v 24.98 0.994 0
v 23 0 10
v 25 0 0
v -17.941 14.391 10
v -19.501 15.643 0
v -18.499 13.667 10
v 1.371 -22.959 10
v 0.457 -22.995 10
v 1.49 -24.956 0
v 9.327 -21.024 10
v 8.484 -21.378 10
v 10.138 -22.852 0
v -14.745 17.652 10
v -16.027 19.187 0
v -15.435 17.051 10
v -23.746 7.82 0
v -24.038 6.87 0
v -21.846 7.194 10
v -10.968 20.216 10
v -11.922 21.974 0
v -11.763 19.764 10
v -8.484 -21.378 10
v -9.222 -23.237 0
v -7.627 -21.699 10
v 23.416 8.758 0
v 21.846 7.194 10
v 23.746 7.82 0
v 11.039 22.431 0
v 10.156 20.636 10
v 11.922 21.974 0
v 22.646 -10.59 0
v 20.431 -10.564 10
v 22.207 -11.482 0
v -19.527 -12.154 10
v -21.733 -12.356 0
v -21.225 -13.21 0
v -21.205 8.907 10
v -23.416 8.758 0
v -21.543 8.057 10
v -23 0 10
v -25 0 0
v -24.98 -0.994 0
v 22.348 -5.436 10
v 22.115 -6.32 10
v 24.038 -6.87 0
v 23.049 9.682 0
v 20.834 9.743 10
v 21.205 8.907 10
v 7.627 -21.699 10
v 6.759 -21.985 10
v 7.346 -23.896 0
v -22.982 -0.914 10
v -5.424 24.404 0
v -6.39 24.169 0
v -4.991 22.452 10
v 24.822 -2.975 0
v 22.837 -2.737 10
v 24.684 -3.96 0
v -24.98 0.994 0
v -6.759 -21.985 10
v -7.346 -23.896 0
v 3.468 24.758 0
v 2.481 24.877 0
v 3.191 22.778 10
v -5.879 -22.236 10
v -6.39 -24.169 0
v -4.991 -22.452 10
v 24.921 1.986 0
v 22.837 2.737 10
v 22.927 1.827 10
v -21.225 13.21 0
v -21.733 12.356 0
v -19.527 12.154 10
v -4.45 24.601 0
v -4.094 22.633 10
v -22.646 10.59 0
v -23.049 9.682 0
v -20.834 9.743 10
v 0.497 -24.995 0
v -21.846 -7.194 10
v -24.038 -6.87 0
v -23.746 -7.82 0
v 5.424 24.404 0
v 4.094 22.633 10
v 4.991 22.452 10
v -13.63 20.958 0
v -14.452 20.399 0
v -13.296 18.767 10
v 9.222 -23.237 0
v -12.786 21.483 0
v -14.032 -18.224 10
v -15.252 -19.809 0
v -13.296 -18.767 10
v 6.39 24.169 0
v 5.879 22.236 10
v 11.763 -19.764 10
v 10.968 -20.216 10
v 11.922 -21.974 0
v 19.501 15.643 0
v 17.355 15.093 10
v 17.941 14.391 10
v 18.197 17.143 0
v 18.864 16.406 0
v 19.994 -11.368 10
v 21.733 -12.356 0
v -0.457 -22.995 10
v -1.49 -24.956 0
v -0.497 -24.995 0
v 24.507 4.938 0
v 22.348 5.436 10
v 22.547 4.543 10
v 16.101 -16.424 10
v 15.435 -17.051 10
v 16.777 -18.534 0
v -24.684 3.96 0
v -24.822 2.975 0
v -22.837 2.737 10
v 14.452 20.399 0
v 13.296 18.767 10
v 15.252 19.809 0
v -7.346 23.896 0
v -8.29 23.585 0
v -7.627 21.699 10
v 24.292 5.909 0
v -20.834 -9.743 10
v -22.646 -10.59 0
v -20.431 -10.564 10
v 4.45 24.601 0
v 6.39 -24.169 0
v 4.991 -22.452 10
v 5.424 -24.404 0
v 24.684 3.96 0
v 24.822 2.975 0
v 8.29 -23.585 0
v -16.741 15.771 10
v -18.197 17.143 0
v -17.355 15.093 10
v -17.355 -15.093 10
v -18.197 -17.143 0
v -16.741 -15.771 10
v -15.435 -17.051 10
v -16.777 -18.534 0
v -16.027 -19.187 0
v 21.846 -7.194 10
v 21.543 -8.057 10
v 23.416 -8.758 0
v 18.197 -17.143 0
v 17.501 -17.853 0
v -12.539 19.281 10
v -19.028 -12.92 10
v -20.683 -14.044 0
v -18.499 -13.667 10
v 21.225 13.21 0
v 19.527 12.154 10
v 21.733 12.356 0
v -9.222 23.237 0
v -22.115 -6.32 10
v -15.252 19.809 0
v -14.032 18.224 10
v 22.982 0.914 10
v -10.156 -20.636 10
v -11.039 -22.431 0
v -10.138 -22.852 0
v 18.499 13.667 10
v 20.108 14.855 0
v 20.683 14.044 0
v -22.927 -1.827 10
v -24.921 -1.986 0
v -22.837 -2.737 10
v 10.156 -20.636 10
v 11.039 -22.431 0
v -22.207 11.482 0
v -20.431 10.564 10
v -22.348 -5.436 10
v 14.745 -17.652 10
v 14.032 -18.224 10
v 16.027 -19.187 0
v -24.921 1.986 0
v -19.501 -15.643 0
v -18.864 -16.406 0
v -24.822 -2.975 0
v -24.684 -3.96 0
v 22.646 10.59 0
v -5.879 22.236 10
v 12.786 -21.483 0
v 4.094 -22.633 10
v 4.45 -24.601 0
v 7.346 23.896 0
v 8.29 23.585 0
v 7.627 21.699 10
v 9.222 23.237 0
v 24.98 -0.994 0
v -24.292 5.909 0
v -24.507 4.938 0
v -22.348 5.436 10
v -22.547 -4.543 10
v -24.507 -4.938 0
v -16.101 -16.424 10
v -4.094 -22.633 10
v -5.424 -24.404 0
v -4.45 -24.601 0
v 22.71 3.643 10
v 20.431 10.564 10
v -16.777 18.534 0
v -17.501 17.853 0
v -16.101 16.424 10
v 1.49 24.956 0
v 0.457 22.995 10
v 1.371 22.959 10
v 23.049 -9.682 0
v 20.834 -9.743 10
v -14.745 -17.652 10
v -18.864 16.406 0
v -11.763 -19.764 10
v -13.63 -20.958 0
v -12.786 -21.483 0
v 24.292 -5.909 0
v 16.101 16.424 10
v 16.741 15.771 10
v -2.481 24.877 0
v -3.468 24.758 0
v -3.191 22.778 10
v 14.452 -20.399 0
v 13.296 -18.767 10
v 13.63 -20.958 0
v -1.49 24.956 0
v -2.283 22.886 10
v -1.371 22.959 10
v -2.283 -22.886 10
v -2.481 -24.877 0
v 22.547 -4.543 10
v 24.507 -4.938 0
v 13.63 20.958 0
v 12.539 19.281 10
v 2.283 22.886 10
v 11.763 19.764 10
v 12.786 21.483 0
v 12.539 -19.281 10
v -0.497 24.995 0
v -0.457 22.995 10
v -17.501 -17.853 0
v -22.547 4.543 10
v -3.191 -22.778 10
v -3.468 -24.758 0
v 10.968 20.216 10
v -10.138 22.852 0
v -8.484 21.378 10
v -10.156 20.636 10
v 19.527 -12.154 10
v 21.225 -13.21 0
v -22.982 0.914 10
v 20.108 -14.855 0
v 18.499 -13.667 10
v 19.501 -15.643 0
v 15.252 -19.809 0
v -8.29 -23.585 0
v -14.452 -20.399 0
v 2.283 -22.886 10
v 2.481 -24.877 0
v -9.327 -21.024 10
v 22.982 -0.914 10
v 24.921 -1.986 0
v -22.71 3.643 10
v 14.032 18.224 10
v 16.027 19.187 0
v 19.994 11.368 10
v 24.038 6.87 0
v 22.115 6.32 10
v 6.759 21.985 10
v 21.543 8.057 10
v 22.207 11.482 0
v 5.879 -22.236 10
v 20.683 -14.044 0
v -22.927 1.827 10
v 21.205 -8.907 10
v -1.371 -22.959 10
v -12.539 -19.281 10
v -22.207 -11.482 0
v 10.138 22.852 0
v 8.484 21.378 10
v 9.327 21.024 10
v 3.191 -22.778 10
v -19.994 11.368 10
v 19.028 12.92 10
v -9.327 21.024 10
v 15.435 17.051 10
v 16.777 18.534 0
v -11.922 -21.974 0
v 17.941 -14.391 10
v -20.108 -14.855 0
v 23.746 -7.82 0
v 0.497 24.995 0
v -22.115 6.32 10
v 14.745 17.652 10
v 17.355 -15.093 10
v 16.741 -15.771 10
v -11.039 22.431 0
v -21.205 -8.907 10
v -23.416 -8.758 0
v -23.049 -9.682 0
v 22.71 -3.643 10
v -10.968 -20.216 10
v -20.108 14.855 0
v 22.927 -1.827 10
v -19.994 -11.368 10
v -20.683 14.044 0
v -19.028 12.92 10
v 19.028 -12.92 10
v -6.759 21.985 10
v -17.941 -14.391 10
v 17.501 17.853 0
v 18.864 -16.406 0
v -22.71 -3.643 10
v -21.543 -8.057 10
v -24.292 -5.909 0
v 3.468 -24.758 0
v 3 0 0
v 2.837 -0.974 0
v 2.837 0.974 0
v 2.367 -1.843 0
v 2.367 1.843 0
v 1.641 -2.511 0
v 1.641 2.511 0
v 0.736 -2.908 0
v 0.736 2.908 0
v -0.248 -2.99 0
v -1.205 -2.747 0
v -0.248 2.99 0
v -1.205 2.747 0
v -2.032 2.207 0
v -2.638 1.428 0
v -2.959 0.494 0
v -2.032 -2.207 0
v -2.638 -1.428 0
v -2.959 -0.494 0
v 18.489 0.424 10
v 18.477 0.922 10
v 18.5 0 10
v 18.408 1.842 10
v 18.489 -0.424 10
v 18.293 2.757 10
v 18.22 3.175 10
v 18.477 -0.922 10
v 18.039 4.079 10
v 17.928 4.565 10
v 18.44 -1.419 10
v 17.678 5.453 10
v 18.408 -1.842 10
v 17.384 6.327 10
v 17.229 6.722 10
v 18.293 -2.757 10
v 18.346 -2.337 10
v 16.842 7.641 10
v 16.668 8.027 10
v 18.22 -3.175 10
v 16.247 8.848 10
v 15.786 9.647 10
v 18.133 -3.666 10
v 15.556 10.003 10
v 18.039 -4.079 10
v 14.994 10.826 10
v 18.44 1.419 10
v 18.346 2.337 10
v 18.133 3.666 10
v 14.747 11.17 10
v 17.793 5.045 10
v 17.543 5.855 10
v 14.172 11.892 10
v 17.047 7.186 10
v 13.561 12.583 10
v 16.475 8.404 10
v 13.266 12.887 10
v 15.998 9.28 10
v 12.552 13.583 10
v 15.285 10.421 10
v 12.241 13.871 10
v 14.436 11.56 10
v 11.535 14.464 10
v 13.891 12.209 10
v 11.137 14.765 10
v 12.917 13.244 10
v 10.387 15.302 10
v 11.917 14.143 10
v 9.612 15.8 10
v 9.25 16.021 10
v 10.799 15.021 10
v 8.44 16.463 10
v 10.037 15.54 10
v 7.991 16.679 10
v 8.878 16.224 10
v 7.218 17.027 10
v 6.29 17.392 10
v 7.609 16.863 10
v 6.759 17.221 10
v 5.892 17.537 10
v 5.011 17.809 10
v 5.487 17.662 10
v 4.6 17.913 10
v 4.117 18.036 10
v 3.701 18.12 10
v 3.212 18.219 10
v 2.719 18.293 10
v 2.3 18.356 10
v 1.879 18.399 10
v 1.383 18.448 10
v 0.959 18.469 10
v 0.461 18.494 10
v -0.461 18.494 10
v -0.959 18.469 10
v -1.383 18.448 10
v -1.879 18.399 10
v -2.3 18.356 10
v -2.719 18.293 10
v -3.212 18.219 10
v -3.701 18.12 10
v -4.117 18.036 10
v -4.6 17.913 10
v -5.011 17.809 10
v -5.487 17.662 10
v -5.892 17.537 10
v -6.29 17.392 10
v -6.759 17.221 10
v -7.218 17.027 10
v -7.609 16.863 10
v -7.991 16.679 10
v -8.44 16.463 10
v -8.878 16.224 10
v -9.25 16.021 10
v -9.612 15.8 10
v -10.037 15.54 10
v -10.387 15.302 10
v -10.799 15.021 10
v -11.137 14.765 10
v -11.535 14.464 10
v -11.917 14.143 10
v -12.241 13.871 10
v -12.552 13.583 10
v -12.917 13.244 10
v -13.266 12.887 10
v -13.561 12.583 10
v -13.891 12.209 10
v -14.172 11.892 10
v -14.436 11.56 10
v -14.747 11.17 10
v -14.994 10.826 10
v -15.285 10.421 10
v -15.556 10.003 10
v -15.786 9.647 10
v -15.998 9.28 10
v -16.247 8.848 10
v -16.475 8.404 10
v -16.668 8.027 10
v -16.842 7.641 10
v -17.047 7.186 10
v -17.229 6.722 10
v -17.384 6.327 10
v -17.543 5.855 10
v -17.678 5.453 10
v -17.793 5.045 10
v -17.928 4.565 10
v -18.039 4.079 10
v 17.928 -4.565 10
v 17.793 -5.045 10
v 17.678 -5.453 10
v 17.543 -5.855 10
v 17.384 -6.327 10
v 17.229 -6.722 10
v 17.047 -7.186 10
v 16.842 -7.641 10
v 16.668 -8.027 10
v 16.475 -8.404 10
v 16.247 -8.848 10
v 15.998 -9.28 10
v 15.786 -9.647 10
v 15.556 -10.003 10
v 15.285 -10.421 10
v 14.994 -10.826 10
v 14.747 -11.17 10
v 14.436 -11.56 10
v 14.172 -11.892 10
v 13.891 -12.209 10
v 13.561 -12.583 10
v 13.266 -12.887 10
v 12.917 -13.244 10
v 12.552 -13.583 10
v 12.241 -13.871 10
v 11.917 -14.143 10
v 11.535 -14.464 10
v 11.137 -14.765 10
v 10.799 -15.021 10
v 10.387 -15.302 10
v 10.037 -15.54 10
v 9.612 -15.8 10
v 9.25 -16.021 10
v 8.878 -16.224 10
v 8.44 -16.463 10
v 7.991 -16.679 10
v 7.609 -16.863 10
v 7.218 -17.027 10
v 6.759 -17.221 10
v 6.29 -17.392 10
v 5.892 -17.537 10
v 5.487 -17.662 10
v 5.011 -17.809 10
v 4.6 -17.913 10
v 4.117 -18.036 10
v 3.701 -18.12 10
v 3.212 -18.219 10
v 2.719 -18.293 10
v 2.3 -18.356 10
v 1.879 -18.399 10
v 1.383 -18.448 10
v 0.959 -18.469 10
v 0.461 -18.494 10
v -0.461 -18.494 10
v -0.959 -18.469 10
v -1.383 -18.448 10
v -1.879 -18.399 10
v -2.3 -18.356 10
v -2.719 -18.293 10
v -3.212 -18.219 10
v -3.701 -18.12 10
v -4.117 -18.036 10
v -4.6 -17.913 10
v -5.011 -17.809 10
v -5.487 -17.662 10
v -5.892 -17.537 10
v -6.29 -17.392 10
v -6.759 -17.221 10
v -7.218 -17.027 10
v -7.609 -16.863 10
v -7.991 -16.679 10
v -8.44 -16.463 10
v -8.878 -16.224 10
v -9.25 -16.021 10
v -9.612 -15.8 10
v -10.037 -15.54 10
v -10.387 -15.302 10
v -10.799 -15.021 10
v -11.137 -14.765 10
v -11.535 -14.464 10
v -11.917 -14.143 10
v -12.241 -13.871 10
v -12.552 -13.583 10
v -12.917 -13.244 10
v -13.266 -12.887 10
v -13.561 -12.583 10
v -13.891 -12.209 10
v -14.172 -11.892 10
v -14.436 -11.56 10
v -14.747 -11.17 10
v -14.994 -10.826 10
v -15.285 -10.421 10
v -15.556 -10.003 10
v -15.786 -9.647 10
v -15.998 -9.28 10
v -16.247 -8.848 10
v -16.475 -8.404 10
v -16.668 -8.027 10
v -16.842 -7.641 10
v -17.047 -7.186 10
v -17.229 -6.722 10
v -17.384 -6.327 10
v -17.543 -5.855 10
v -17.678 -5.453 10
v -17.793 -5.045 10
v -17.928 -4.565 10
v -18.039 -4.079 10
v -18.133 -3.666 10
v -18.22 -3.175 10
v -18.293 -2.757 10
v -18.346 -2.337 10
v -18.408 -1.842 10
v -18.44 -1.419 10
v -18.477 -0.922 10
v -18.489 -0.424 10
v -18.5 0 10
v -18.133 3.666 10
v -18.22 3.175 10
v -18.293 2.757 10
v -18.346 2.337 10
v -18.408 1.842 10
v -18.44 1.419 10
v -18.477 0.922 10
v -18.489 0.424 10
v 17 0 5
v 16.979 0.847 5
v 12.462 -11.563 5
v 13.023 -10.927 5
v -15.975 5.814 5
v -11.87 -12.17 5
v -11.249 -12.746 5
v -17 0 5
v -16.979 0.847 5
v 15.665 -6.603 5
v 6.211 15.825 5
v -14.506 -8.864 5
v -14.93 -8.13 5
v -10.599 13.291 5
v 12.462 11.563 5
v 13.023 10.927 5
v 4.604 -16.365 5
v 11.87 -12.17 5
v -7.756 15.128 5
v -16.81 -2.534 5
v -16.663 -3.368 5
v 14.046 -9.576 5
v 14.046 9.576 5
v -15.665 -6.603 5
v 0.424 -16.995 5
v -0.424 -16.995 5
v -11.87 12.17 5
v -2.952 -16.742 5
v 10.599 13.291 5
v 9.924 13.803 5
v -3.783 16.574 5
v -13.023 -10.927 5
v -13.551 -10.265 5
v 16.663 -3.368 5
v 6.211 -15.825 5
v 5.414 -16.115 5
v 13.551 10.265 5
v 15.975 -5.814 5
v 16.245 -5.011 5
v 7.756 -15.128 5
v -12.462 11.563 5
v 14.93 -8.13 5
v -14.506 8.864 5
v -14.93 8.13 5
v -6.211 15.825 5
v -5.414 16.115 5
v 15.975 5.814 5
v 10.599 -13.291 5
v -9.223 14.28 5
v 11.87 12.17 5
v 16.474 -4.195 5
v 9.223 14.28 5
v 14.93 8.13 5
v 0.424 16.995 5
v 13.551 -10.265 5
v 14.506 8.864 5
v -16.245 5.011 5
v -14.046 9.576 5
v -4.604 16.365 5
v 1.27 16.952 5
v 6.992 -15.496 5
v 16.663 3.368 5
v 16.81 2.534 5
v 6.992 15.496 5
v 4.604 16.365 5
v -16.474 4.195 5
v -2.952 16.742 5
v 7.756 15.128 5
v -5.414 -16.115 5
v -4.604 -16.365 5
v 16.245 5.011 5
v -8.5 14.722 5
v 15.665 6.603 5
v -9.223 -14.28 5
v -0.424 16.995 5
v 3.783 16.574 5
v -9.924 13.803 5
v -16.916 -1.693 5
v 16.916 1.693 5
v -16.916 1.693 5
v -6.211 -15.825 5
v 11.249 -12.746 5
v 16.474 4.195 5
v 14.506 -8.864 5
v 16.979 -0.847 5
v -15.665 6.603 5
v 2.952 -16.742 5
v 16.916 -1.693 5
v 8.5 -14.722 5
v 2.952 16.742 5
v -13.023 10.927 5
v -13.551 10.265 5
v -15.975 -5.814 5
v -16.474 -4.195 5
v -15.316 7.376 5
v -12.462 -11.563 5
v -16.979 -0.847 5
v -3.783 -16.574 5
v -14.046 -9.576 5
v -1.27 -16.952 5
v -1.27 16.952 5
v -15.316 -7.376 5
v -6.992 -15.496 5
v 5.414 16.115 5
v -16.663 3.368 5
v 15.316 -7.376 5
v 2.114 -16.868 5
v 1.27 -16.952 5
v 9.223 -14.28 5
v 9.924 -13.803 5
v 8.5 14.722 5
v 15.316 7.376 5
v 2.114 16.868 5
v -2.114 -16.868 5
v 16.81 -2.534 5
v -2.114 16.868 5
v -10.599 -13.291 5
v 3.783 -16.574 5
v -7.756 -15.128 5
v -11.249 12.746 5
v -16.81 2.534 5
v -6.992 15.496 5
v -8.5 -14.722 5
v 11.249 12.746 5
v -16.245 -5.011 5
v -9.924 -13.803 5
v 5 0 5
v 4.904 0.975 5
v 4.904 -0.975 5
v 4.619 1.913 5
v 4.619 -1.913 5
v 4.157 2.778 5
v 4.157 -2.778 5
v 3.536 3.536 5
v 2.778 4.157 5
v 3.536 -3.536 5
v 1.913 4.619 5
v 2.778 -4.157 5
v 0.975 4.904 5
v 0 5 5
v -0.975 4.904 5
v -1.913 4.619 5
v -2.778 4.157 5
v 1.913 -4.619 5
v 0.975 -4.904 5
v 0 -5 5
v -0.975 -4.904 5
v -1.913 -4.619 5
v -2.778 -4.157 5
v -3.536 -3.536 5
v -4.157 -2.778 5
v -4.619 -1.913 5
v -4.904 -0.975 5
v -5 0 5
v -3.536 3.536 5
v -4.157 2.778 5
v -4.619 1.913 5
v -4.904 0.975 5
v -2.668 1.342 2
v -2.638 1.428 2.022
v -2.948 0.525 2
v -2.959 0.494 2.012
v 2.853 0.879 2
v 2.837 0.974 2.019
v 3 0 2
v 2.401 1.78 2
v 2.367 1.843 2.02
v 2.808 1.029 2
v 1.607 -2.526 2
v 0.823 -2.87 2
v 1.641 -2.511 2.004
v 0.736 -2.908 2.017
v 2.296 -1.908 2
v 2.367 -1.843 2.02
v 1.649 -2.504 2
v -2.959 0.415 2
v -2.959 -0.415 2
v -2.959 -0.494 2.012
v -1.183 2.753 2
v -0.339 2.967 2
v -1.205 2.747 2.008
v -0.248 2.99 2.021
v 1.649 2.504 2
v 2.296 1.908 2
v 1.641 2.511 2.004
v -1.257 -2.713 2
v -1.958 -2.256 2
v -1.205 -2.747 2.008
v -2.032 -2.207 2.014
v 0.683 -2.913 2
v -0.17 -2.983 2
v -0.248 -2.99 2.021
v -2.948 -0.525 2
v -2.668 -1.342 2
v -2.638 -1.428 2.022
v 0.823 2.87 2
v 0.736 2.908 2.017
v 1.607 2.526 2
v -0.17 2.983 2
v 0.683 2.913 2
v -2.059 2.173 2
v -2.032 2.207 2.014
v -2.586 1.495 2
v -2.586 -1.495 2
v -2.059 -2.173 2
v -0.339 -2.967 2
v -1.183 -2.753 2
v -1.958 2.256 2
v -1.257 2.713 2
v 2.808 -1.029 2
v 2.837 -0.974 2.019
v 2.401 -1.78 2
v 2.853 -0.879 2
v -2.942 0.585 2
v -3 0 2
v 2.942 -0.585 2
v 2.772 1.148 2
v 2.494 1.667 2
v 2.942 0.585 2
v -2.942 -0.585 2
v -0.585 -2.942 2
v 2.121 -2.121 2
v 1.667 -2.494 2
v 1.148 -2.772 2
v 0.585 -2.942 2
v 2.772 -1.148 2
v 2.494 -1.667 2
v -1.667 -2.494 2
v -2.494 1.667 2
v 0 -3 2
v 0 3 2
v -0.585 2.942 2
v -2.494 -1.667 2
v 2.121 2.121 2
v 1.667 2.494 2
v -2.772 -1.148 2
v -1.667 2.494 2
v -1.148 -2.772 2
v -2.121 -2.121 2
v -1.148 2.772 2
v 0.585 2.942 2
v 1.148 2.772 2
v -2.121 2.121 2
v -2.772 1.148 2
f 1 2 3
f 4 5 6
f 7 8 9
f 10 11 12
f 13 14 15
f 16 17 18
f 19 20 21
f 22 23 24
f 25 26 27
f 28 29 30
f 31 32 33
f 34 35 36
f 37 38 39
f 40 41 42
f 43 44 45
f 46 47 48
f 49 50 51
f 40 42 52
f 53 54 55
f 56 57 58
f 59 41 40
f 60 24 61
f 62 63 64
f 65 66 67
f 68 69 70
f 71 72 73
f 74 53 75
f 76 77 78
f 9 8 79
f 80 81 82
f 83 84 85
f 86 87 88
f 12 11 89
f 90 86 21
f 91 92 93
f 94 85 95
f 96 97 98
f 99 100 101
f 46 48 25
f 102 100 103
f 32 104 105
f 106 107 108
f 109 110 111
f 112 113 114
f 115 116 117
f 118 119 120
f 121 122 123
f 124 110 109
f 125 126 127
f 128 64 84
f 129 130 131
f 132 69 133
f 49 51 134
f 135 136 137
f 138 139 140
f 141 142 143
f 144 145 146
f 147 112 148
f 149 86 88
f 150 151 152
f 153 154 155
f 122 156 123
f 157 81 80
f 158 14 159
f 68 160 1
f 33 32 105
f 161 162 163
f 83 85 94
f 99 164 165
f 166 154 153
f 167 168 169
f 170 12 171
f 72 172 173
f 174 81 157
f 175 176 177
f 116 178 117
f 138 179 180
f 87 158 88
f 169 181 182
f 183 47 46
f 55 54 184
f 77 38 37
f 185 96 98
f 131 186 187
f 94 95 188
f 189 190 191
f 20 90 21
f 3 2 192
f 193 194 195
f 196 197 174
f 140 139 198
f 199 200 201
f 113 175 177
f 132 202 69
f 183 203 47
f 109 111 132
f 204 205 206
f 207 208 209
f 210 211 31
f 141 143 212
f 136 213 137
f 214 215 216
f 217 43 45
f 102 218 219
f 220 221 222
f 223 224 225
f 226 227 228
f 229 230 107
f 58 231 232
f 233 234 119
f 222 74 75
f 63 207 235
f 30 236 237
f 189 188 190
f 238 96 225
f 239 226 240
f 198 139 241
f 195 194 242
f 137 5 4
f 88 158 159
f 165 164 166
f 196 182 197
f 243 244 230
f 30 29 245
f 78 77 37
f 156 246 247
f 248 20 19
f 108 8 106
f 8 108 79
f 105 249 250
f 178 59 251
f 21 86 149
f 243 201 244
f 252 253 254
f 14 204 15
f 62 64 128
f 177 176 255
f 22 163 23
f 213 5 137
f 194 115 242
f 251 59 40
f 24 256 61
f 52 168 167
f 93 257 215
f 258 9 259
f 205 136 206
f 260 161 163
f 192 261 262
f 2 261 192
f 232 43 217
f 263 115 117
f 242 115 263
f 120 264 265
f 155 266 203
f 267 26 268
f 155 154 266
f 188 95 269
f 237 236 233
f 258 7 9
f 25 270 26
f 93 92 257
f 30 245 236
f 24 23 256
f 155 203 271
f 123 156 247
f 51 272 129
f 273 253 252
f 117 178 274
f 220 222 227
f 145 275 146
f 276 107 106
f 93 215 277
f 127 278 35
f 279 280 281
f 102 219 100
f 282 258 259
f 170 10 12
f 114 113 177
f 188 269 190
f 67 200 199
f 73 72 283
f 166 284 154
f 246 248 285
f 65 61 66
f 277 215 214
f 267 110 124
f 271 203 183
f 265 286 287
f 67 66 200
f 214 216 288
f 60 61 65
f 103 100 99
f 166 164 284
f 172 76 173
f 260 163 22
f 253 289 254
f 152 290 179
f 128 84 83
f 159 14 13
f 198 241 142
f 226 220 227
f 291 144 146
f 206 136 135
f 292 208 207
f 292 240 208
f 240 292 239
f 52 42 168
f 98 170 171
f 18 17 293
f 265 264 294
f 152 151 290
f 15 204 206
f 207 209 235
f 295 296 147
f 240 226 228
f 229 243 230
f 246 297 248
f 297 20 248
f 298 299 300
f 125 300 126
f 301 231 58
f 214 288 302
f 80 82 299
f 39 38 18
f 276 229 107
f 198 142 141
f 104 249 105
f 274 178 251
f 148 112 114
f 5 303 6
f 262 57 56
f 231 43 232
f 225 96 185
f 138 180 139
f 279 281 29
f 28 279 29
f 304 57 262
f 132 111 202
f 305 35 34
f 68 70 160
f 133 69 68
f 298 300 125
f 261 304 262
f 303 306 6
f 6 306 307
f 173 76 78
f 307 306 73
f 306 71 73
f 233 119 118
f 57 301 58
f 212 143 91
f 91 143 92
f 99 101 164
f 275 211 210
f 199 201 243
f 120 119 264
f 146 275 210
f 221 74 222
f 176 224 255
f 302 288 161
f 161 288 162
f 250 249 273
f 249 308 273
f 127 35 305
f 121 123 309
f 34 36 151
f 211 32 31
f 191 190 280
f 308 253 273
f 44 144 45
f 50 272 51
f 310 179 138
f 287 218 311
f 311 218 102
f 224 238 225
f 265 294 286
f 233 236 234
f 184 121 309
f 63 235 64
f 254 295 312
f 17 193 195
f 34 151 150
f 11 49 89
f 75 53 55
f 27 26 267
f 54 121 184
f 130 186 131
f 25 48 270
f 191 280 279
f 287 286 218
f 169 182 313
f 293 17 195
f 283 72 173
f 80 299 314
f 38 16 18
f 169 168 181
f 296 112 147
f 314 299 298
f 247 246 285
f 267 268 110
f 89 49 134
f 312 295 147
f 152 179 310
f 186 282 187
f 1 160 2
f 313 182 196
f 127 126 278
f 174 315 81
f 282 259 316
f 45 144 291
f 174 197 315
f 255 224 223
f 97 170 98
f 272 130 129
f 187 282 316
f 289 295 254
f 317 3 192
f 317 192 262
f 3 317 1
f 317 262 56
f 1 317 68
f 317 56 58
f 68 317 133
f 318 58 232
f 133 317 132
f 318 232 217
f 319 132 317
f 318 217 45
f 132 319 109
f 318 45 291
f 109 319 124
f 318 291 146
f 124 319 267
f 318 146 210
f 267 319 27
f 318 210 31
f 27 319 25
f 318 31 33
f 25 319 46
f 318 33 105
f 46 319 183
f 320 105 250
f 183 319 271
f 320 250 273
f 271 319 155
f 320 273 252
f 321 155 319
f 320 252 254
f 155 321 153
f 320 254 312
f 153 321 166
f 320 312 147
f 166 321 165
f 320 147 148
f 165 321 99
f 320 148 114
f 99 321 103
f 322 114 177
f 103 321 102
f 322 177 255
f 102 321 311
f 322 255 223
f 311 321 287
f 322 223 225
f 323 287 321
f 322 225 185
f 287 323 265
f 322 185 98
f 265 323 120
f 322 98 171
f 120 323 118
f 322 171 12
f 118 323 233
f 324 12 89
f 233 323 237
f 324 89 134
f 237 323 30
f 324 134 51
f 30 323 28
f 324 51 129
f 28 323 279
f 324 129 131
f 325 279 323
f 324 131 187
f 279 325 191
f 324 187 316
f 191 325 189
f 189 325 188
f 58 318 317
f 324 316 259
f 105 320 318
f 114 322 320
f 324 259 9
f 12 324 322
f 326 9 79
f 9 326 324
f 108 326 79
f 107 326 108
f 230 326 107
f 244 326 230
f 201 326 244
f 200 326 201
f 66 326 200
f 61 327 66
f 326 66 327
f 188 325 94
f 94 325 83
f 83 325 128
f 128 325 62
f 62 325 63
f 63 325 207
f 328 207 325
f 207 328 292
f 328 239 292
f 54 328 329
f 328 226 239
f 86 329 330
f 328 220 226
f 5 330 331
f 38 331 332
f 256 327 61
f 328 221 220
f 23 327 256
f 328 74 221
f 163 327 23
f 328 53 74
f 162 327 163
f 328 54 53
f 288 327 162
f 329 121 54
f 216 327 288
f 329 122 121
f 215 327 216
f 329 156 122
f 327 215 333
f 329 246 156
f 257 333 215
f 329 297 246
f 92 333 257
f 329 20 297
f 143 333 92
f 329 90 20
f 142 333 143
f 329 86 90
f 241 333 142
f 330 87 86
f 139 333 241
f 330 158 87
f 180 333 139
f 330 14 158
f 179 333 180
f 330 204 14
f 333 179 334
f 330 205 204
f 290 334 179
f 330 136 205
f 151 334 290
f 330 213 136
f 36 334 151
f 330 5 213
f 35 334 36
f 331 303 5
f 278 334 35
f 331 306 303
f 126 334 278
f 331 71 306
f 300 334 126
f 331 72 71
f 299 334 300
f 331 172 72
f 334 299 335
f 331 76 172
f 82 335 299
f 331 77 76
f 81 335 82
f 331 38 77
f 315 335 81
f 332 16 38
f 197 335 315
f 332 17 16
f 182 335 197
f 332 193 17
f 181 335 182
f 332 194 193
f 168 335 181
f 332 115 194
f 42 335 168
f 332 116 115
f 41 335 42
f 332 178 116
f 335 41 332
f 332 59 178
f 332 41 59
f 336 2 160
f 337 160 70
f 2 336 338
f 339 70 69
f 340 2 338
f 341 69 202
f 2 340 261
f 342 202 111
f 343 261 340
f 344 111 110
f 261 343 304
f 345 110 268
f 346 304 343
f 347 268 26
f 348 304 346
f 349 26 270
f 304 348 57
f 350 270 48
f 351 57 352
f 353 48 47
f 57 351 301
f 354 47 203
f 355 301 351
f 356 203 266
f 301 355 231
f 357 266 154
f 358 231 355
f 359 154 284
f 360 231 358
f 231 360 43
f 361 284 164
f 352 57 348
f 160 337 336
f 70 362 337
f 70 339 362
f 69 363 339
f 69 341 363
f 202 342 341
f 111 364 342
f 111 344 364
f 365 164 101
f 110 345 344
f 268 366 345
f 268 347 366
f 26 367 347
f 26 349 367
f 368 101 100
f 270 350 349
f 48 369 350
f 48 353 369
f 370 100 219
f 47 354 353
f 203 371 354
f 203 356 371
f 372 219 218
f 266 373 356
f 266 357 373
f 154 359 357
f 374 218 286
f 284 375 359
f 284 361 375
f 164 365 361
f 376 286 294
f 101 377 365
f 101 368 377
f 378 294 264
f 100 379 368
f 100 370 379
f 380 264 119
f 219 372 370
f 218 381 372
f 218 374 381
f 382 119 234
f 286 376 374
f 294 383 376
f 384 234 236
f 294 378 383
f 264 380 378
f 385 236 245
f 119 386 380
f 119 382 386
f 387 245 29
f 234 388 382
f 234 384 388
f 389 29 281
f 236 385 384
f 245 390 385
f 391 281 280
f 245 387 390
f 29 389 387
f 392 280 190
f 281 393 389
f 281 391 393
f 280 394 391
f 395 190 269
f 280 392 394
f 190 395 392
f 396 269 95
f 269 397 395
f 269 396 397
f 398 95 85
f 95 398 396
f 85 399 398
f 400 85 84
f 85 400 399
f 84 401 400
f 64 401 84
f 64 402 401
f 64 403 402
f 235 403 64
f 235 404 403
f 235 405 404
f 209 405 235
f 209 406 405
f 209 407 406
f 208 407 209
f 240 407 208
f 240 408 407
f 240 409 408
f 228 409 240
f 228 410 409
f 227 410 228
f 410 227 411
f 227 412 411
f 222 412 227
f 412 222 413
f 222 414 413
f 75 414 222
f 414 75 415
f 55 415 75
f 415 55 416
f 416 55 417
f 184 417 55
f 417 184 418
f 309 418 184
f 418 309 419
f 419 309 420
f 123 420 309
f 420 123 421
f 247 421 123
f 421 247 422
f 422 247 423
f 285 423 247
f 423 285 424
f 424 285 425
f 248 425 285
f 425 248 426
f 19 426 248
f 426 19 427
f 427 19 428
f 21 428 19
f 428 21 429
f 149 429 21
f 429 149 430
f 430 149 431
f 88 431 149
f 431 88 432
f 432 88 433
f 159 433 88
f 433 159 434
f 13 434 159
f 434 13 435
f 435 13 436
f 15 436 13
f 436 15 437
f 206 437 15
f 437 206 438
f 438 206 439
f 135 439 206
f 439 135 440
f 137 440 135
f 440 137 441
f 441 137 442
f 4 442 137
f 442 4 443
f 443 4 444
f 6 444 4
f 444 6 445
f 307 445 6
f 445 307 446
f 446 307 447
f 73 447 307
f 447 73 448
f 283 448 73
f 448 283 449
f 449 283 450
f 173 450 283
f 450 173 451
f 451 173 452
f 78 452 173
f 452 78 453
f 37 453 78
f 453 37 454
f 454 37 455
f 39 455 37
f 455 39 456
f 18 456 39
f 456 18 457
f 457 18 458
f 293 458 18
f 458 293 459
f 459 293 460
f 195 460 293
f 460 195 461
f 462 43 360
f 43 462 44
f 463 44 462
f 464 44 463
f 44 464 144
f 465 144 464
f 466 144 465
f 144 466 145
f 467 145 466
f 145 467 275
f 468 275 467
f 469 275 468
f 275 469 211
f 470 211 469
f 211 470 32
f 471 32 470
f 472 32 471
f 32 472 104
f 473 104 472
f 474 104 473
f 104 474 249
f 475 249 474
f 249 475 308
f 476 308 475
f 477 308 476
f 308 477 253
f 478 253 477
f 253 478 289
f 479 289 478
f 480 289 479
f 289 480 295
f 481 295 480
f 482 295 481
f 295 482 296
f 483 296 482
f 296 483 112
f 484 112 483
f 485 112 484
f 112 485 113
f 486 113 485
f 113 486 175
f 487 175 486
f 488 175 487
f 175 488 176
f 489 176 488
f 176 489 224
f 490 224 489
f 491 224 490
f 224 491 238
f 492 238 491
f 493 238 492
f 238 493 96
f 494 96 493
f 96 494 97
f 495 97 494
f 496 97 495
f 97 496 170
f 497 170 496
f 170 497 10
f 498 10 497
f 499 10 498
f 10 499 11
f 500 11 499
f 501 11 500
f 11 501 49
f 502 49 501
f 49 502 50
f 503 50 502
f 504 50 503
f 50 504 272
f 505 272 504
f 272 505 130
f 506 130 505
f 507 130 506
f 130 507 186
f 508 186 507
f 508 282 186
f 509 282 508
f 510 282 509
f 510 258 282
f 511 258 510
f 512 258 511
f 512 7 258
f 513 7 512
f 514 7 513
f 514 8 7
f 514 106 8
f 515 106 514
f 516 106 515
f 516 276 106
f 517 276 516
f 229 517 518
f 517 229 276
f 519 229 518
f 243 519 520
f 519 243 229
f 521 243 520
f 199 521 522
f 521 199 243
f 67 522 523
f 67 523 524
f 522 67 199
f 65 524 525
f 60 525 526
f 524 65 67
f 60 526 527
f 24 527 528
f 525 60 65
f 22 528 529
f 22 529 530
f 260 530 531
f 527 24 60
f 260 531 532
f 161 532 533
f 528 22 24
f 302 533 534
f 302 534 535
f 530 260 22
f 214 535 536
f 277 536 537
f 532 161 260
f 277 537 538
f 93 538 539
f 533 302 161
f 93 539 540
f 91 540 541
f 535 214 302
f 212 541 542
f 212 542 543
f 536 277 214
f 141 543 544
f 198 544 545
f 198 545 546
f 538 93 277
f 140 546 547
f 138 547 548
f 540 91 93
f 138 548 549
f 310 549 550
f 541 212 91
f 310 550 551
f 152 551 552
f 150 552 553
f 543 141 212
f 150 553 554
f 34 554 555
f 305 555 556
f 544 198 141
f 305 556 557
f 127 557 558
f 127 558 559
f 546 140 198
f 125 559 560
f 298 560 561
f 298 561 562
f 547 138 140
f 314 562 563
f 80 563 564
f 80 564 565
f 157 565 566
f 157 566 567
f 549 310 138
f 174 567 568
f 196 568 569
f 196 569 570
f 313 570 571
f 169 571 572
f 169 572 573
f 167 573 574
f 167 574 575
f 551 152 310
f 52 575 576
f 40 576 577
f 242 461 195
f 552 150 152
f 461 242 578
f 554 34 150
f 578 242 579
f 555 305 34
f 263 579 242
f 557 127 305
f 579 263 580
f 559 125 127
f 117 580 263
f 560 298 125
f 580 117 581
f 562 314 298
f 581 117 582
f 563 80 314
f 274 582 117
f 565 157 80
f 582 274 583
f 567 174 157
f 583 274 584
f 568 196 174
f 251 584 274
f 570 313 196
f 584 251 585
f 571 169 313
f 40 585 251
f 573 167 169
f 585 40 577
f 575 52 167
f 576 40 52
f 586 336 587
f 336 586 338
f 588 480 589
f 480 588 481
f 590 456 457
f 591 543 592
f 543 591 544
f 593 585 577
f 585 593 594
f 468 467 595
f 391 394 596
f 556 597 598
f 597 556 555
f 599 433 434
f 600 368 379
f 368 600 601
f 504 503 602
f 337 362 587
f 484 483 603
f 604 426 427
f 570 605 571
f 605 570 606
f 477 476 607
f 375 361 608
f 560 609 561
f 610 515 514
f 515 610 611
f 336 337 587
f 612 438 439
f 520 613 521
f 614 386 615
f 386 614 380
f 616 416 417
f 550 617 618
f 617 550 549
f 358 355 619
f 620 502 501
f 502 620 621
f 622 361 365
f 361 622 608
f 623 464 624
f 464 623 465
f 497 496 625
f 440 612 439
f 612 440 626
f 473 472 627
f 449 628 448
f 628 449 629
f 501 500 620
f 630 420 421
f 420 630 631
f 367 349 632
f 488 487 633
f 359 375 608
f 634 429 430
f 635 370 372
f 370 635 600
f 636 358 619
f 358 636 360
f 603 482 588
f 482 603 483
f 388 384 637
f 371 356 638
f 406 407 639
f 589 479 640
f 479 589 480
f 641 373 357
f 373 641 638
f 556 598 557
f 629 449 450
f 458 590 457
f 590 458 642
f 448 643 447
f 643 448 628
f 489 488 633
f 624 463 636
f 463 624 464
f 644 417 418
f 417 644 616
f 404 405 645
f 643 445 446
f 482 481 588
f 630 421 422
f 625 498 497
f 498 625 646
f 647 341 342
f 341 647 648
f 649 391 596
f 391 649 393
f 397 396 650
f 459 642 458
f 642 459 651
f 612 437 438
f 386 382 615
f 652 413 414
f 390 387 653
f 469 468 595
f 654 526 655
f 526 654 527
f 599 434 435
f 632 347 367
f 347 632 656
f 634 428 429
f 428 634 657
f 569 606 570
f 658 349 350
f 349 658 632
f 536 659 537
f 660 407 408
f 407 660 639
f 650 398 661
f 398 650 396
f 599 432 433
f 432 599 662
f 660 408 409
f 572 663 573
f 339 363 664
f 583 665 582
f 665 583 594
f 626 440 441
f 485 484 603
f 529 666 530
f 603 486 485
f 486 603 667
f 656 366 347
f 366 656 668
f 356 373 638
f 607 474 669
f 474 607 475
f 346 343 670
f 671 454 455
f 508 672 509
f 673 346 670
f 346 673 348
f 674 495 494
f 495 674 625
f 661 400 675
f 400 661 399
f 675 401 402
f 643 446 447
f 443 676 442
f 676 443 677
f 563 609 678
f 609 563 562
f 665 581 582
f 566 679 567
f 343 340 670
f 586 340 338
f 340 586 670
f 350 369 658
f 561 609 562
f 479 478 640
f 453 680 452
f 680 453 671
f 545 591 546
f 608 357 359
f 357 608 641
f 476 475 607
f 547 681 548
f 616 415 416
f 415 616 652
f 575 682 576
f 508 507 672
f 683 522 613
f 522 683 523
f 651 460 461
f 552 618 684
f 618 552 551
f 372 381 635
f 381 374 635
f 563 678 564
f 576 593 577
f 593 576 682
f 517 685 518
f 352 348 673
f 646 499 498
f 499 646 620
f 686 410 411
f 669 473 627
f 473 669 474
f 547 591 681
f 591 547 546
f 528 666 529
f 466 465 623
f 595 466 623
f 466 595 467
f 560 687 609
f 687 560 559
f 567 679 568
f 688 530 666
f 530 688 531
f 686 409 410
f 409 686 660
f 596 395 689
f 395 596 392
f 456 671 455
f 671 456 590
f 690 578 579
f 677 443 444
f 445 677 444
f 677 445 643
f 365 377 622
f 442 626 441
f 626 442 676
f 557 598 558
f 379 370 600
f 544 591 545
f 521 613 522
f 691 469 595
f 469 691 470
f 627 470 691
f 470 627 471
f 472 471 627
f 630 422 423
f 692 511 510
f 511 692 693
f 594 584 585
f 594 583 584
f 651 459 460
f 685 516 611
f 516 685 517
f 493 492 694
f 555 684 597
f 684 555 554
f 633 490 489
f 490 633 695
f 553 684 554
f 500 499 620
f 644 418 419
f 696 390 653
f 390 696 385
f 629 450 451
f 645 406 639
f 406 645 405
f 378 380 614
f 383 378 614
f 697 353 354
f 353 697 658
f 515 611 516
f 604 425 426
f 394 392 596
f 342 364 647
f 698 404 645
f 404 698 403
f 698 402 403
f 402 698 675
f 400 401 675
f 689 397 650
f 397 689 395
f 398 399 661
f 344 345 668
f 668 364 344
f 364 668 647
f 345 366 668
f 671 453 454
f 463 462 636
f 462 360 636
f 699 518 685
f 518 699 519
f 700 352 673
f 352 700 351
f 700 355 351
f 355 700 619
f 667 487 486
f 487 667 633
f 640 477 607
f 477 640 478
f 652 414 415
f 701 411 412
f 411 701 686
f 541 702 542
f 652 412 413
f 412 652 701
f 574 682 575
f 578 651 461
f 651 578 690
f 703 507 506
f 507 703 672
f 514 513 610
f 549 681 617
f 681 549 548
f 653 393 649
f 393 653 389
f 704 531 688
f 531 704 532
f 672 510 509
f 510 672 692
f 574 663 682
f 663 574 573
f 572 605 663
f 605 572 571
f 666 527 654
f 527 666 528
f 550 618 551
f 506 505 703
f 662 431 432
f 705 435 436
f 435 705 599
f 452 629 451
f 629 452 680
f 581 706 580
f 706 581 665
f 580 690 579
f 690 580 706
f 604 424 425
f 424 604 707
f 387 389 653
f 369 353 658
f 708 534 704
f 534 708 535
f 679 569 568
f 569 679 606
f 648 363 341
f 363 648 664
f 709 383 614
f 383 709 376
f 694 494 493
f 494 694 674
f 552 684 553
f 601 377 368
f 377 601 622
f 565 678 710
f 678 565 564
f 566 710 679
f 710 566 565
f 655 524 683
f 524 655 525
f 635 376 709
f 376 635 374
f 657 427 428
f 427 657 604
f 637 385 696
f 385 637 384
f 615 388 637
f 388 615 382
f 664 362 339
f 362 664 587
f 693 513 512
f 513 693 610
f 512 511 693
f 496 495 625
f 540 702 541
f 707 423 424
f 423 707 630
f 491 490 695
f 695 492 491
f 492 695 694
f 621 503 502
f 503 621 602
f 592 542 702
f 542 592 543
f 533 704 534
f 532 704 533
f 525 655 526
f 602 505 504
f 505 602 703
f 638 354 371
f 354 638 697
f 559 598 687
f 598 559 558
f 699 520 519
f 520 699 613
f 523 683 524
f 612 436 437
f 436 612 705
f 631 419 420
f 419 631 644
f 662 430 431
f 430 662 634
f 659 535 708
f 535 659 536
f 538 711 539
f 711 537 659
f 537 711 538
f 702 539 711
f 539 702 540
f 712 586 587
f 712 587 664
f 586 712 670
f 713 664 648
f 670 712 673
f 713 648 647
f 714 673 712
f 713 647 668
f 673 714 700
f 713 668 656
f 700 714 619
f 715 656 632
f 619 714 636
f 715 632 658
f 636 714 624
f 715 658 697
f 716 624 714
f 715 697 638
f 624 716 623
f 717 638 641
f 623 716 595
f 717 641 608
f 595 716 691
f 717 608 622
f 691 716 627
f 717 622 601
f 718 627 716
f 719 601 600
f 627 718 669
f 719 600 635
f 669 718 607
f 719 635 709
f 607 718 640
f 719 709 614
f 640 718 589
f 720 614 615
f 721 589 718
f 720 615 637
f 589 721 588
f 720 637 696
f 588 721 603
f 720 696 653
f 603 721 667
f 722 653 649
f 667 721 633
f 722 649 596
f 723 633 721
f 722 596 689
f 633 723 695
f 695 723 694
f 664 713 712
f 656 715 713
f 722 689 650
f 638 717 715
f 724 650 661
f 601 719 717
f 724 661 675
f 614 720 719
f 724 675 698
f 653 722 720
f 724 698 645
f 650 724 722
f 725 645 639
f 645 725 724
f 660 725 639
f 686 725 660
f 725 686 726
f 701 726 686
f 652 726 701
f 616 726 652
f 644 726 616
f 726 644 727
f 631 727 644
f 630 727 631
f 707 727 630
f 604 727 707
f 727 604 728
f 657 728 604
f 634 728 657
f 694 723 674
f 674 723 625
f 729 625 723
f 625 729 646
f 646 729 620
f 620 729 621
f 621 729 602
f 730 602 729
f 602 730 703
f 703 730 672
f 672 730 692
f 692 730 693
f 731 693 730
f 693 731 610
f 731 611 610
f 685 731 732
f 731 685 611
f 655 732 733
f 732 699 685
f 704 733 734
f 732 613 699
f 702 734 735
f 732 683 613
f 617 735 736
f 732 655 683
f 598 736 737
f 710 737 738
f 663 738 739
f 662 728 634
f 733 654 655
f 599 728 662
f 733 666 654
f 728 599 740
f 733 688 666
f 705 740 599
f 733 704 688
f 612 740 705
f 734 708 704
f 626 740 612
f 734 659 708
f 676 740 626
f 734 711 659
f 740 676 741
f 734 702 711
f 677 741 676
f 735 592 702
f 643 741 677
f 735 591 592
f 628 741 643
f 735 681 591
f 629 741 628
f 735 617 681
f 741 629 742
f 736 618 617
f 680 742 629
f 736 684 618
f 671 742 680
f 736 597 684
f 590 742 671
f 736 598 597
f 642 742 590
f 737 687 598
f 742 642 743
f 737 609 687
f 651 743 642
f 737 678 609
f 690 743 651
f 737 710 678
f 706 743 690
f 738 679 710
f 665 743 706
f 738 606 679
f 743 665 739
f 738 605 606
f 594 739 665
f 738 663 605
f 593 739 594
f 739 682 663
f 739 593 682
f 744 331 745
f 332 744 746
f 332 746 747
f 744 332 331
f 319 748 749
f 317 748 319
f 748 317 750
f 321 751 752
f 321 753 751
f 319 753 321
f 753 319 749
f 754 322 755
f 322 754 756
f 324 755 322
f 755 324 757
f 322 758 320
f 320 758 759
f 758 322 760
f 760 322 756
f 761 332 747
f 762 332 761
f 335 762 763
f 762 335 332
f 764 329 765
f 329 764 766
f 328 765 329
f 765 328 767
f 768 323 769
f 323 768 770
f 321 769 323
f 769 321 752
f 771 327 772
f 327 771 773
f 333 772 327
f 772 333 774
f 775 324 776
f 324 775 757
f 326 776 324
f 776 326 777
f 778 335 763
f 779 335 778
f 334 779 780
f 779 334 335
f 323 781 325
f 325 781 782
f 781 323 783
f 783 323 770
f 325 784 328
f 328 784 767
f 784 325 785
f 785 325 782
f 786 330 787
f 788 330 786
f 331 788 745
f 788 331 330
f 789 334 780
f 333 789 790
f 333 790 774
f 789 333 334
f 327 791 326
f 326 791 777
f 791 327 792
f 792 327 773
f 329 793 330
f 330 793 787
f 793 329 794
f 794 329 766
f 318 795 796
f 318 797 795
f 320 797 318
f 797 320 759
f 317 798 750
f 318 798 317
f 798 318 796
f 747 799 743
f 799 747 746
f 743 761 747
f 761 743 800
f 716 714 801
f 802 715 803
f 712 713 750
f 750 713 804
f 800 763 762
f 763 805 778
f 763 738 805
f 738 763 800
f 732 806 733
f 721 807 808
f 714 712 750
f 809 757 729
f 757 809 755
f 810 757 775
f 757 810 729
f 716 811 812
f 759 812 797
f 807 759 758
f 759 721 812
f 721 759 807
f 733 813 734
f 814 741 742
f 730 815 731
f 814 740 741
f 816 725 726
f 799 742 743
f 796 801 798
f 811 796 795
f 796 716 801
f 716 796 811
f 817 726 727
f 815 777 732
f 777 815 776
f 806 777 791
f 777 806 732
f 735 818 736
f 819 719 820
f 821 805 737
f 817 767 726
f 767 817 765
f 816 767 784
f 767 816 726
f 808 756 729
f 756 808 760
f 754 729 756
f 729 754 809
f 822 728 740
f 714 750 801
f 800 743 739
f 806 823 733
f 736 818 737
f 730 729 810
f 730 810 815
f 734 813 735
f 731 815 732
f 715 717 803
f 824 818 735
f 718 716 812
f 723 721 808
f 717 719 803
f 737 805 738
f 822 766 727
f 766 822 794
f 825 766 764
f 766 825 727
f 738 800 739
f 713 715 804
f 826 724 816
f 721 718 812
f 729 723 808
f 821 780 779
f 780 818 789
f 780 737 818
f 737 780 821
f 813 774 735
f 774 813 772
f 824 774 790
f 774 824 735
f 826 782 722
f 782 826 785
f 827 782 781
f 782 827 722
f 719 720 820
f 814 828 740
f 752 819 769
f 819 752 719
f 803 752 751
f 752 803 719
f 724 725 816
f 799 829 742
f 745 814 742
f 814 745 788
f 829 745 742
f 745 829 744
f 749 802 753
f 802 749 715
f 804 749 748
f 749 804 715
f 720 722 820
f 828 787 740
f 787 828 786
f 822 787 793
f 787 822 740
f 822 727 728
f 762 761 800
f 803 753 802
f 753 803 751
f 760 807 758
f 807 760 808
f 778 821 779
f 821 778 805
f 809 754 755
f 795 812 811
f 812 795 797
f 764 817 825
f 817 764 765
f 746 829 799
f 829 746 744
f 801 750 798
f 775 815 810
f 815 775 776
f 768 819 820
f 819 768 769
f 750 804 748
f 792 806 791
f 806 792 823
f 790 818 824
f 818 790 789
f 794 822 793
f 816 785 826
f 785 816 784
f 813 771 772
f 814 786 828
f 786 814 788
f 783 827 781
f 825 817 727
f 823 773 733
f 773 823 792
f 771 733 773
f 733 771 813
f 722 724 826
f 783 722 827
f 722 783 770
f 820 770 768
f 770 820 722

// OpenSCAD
rod_diameter = 30;

module wall_cup(rod_diameter=0) {
    $fs = 1;
    $fa = 1;
    cup_height = 10;
    
    difference() {
        cylinder(
            r1=( rod_diameter / 2 ) + 10,
            r2=( rod_diameter / 2 ) + 8,
            h = cup_height
        );
        
        translate([0, 0, 5])
            cylinder(
                r1=( rod_diameter / 2 ) + 2,
                r2=( rod_diameter / 2 ) + 5,
                h = cup_height
            );
        
        cylinder(r=3, h=cup_height);
        
        translate([0, 0, 2]) cylinder(r1=3, r2=5, h=3);
    }
}

wall_cup(rod_diameter=rod_diameter);
